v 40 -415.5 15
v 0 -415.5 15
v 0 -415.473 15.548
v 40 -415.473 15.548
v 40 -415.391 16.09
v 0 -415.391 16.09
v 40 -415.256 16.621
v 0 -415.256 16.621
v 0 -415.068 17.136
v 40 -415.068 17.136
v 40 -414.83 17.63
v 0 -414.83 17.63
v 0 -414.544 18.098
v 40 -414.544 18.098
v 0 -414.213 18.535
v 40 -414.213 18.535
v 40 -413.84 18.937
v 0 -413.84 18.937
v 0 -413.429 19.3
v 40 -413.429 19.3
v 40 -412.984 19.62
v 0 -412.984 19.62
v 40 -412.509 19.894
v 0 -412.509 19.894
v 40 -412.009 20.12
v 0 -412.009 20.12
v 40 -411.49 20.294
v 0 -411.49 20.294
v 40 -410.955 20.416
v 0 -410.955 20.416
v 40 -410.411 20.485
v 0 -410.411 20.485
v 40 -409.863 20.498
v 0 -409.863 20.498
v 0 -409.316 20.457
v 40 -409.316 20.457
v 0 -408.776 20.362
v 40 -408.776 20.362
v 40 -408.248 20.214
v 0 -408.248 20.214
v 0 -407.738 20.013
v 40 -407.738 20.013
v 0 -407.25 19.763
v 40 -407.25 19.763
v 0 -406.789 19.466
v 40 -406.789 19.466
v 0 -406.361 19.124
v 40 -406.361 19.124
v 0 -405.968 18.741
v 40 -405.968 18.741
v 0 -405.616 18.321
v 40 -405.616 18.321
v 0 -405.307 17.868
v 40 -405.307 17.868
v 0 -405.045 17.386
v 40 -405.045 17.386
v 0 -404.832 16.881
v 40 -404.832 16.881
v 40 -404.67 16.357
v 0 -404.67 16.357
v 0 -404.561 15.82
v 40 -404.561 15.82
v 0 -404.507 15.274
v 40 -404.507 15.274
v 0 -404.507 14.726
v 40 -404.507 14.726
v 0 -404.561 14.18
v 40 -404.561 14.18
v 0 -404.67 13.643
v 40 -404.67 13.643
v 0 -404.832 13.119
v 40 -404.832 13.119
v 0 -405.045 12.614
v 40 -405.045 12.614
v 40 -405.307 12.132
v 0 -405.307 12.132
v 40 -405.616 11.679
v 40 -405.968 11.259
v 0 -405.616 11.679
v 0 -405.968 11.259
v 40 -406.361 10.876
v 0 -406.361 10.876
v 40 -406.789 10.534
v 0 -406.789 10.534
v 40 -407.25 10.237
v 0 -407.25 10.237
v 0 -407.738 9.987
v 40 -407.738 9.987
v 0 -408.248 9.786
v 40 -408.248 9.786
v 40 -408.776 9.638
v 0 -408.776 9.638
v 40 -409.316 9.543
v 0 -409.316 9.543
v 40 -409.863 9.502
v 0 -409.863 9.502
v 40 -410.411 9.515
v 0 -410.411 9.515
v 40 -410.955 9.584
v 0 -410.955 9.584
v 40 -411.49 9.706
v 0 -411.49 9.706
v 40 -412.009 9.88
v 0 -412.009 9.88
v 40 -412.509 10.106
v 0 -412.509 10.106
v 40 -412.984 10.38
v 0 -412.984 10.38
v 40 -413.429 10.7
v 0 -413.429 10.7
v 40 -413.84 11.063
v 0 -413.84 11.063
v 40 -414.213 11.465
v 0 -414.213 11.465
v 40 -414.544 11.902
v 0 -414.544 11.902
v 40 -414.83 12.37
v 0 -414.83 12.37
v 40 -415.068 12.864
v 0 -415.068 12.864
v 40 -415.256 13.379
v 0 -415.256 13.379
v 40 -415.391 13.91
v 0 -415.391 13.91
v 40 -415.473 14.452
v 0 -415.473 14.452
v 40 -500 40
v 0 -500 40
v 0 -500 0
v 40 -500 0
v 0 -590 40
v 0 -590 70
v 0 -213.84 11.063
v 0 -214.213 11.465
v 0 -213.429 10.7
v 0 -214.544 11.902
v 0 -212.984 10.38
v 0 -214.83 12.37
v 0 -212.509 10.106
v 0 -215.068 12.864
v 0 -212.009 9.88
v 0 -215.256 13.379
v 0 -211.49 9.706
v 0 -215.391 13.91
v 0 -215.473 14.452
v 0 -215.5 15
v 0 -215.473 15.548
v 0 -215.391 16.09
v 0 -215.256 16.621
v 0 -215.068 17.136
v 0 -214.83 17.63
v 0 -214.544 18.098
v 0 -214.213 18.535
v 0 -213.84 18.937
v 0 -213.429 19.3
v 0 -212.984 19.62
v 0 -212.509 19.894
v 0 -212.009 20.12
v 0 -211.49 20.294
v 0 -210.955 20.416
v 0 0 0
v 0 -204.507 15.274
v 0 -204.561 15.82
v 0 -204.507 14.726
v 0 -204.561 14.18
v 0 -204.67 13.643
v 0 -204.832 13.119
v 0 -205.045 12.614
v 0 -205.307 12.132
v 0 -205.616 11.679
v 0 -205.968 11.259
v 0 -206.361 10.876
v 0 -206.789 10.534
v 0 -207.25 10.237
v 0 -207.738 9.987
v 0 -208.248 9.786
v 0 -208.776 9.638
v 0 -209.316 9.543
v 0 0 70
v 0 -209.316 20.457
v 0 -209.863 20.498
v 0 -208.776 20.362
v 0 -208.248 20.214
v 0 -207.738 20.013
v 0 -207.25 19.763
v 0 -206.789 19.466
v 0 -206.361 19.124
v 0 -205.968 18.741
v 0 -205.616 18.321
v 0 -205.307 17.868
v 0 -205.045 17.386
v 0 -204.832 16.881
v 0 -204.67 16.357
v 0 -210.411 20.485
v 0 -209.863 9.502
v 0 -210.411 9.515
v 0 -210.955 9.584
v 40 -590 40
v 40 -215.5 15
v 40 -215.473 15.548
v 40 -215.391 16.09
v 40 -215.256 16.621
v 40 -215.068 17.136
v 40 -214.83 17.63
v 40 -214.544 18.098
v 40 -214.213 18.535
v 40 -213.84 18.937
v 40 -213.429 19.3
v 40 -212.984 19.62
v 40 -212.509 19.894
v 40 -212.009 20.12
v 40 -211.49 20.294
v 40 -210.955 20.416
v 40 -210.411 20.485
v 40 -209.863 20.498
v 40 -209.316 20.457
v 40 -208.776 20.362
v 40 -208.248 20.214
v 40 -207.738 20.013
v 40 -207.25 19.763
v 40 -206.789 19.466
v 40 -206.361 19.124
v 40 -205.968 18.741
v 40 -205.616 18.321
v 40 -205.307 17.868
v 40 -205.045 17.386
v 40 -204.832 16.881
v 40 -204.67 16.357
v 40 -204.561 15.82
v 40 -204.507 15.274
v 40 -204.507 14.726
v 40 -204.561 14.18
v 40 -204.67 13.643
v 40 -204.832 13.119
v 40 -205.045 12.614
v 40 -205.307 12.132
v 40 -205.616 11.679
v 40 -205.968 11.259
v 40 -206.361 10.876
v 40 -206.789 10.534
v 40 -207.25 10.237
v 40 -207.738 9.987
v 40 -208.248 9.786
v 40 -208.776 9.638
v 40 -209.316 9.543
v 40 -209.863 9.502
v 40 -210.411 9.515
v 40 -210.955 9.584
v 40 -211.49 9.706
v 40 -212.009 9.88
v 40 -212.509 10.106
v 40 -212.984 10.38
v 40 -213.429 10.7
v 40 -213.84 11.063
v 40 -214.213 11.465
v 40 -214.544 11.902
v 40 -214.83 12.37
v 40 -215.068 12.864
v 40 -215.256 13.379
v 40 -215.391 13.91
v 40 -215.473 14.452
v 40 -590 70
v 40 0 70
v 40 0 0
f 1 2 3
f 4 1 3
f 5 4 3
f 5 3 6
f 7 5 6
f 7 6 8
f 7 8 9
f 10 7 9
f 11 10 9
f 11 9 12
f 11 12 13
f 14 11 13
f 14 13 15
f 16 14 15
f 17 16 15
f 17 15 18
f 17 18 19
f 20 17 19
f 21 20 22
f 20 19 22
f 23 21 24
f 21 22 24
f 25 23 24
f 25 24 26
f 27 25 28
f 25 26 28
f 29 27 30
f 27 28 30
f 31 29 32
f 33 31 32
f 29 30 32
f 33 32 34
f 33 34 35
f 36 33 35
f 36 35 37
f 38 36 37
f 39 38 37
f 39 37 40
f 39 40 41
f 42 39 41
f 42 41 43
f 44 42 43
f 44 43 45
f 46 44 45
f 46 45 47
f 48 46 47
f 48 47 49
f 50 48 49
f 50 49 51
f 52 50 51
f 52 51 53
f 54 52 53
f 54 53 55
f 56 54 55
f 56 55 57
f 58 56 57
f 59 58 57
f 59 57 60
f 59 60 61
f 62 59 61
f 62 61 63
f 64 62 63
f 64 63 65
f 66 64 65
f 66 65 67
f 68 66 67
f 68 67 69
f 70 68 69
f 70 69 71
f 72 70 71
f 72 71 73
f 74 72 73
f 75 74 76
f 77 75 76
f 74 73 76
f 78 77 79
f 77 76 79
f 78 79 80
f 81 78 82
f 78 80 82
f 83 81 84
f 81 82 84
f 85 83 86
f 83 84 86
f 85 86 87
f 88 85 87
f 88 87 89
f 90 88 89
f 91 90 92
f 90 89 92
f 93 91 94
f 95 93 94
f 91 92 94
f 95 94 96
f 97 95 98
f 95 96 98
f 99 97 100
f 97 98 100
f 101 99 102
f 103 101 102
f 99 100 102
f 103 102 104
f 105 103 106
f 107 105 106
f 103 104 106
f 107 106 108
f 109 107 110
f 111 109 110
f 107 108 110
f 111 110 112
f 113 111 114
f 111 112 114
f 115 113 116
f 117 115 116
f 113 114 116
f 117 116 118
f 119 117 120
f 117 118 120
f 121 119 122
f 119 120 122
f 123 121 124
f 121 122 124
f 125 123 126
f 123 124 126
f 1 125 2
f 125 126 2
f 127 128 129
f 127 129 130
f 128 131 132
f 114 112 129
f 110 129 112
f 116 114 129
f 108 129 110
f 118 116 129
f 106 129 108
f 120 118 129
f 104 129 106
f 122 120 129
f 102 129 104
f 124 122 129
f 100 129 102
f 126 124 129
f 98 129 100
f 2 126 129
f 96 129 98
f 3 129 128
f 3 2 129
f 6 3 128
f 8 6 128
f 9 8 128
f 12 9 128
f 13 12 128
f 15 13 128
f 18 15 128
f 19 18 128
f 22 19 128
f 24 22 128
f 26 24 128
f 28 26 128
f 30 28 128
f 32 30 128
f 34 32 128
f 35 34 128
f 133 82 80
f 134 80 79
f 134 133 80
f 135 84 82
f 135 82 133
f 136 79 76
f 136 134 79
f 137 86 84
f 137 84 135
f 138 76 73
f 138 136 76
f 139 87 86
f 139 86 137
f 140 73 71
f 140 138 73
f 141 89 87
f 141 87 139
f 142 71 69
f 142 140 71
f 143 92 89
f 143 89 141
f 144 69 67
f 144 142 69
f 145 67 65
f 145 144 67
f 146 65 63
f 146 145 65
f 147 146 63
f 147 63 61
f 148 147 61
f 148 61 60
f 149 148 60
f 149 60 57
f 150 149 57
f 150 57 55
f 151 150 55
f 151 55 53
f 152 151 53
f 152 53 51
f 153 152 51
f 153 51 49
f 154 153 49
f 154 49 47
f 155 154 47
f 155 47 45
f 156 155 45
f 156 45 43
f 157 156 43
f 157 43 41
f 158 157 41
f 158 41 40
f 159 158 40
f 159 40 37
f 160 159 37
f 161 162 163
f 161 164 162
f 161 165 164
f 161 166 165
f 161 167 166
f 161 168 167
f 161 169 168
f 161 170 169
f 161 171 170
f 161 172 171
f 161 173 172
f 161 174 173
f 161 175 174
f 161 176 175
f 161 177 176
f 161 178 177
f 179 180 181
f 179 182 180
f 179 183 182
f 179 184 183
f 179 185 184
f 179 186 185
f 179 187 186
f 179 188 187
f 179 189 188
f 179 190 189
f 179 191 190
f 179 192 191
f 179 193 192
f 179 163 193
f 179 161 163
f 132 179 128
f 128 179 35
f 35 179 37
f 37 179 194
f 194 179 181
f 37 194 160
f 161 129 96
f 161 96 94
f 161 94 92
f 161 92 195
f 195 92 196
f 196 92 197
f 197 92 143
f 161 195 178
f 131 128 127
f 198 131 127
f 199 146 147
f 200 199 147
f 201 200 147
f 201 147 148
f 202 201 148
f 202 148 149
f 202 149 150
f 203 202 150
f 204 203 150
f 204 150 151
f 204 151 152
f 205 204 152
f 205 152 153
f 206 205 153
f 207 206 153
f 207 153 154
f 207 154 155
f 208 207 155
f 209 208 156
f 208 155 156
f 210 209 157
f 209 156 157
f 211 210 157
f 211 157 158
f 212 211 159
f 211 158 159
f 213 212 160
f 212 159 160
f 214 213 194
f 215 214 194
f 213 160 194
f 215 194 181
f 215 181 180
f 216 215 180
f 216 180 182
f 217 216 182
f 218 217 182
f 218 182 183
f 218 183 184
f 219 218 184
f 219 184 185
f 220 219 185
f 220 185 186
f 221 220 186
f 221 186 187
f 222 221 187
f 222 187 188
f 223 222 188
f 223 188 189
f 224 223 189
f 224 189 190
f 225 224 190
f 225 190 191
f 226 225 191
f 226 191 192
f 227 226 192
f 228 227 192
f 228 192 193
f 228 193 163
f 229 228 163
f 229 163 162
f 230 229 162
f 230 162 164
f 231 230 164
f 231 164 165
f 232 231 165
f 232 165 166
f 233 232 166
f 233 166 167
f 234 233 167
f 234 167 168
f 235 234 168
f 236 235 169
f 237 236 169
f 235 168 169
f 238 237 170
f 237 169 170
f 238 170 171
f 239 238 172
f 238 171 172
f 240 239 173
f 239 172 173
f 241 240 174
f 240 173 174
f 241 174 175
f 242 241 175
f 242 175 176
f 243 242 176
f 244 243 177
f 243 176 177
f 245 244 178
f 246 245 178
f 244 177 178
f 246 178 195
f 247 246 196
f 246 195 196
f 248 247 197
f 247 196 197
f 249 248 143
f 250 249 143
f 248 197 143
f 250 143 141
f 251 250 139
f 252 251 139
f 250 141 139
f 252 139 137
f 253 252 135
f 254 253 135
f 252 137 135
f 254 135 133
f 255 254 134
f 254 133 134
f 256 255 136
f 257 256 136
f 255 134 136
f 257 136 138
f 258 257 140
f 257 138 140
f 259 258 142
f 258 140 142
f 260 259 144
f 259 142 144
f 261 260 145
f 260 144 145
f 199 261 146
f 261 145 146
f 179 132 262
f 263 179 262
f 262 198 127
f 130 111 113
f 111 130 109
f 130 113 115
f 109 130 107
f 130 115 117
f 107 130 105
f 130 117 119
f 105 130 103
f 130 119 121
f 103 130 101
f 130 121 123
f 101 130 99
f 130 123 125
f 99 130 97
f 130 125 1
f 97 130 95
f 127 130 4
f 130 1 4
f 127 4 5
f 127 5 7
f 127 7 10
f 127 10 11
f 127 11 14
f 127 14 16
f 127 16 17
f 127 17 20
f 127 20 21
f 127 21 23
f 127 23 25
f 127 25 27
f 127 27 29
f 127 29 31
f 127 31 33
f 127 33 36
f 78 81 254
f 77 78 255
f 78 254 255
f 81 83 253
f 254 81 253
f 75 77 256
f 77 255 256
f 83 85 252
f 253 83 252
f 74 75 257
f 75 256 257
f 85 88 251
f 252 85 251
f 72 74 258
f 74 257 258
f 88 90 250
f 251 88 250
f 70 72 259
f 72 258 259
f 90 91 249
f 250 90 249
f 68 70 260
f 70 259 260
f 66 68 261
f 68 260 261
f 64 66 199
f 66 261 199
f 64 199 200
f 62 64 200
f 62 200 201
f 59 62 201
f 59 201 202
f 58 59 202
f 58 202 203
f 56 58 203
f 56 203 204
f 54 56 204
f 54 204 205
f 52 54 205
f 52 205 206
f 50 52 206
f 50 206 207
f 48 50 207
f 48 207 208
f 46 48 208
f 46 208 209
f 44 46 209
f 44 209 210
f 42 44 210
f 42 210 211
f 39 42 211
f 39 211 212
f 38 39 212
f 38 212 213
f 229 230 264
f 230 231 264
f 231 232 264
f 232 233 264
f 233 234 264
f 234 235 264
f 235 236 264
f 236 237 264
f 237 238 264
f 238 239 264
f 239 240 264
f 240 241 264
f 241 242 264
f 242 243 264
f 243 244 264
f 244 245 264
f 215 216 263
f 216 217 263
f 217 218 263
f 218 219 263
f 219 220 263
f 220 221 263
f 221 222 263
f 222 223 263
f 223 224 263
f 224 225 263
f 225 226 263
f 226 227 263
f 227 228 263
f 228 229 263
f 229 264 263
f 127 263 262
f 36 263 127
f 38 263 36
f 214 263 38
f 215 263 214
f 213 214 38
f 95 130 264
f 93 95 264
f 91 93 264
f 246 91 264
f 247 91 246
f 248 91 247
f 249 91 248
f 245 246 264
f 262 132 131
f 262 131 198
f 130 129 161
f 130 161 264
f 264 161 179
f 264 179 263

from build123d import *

# Parameters (mm, degrees)
F0_W     = 40
F0_H     = 70
F1_DEPTH = 500
F3_D     = 11
F3_DEPTH = 50
F4_W     = 40
F4_H     = 30
F5_DEPTH = 90


with BuildPart() as f1:
    # F0 (on Front) → F1 (new body)
    with BuildSketch(Plane.XZ):
        with Locations((20, 35)):
            Rectangle(F0_W, F0_H)
    extrude(amount=F1_DEPTH)

    # F3
    with Locations(Plane.YZ.offset(40)):
        with Locations((-410, 15), (-210, 15)):
            Hole(F3_D / 2, depth=F3_DEPTH)

    # F4 (on face) → F5 (join)
    with BuildSketch(Plane.XZ.offset(500)):
        with Locations((20, 55)):
            Rectangle(F4_W, F4_H)
    extrude(amount=F5_DEPTH)


solid = f1.part
